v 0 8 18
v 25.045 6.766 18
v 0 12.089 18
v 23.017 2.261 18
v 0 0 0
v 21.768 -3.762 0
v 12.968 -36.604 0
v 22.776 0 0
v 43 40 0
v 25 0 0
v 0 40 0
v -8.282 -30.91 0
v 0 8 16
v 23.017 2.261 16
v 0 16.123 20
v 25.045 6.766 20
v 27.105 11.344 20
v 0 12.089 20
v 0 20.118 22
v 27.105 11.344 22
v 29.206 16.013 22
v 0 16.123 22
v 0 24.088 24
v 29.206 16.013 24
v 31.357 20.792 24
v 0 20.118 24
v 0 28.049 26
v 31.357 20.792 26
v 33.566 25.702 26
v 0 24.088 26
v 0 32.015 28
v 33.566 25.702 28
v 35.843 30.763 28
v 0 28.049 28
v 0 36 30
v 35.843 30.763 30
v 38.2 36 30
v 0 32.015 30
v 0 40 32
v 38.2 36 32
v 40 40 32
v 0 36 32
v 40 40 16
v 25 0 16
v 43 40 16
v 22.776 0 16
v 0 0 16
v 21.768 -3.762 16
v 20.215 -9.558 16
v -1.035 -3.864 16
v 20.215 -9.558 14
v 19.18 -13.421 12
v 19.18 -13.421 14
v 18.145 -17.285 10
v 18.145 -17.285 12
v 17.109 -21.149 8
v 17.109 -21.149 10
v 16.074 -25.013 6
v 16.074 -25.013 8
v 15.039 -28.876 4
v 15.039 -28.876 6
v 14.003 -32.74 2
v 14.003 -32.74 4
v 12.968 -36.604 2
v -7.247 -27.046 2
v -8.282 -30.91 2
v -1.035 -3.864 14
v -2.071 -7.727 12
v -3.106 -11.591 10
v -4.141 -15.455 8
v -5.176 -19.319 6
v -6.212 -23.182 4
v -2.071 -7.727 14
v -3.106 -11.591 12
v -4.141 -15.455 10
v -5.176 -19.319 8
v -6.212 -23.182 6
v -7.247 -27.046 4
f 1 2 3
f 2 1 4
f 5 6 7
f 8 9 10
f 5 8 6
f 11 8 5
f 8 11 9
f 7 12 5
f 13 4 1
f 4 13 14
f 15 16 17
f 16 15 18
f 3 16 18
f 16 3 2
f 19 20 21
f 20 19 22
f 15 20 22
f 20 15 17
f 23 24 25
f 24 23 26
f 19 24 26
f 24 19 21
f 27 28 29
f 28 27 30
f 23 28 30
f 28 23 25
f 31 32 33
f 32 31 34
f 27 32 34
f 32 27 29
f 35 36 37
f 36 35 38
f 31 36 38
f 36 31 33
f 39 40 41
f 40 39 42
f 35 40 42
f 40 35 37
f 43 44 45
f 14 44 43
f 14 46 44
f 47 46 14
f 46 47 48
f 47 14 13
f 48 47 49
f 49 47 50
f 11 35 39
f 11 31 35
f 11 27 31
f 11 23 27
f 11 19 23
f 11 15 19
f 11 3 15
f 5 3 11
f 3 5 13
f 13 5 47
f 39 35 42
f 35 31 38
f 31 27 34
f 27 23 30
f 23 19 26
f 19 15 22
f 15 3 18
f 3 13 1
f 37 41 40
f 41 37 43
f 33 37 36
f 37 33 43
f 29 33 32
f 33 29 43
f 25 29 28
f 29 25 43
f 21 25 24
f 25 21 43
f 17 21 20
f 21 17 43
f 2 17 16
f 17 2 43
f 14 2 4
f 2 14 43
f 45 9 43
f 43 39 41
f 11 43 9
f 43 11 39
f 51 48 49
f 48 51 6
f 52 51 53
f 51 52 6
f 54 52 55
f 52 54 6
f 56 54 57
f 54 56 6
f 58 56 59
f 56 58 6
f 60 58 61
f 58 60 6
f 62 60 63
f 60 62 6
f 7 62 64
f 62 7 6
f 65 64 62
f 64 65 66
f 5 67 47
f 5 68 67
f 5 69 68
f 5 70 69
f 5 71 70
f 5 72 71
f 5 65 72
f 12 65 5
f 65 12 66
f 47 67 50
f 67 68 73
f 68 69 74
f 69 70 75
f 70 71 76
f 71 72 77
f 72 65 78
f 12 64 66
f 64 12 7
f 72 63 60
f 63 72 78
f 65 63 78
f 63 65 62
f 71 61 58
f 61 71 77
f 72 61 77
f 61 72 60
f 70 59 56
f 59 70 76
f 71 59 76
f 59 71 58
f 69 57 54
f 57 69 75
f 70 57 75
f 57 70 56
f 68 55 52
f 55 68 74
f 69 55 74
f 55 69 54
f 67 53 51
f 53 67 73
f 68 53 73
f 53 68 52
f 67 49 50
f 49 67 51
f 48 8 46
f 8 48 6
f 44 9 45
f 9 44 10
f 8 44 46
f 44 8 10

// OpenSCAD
gap=0.3;
wid=22; 
lwid=40; 

intersection() {   
    color([0,0,1]) linear_extrude(32) polygon([[0,0],[wid,0],[lwid,40],[0,40]]);
    // Stufen oberes Segment
    union(){
        translate([0,8,0]) rotate([0,0,-16]) for (ii=[1:8]) {
            rotate([0,0,2*ii]) translate([-5,(ii-1)*4,0]) cube([5+lwid,6,ii*2+16]);
        }
        // Podest
        color([0,1,1])cube([50,50,16]);
    }
}

// Podest
color([0,1,1]) rotate([0,0,-15]) translate([0,-4,0]) cube([22,20,16]);
// Stufen unteres Segment
color([1,1,0]) rotate([0,0,-15]) translate([0,-32,0]) for (ii=[1:8]) {
    translate([0,(ii-1)*4,0]) cube([wid,6,ii*2]);
}

color([1,0,1]) 
linear_extrude(16) polygon([[0,0],[22/cos(0.30)+3,0],[43,40],[0,40]]);
